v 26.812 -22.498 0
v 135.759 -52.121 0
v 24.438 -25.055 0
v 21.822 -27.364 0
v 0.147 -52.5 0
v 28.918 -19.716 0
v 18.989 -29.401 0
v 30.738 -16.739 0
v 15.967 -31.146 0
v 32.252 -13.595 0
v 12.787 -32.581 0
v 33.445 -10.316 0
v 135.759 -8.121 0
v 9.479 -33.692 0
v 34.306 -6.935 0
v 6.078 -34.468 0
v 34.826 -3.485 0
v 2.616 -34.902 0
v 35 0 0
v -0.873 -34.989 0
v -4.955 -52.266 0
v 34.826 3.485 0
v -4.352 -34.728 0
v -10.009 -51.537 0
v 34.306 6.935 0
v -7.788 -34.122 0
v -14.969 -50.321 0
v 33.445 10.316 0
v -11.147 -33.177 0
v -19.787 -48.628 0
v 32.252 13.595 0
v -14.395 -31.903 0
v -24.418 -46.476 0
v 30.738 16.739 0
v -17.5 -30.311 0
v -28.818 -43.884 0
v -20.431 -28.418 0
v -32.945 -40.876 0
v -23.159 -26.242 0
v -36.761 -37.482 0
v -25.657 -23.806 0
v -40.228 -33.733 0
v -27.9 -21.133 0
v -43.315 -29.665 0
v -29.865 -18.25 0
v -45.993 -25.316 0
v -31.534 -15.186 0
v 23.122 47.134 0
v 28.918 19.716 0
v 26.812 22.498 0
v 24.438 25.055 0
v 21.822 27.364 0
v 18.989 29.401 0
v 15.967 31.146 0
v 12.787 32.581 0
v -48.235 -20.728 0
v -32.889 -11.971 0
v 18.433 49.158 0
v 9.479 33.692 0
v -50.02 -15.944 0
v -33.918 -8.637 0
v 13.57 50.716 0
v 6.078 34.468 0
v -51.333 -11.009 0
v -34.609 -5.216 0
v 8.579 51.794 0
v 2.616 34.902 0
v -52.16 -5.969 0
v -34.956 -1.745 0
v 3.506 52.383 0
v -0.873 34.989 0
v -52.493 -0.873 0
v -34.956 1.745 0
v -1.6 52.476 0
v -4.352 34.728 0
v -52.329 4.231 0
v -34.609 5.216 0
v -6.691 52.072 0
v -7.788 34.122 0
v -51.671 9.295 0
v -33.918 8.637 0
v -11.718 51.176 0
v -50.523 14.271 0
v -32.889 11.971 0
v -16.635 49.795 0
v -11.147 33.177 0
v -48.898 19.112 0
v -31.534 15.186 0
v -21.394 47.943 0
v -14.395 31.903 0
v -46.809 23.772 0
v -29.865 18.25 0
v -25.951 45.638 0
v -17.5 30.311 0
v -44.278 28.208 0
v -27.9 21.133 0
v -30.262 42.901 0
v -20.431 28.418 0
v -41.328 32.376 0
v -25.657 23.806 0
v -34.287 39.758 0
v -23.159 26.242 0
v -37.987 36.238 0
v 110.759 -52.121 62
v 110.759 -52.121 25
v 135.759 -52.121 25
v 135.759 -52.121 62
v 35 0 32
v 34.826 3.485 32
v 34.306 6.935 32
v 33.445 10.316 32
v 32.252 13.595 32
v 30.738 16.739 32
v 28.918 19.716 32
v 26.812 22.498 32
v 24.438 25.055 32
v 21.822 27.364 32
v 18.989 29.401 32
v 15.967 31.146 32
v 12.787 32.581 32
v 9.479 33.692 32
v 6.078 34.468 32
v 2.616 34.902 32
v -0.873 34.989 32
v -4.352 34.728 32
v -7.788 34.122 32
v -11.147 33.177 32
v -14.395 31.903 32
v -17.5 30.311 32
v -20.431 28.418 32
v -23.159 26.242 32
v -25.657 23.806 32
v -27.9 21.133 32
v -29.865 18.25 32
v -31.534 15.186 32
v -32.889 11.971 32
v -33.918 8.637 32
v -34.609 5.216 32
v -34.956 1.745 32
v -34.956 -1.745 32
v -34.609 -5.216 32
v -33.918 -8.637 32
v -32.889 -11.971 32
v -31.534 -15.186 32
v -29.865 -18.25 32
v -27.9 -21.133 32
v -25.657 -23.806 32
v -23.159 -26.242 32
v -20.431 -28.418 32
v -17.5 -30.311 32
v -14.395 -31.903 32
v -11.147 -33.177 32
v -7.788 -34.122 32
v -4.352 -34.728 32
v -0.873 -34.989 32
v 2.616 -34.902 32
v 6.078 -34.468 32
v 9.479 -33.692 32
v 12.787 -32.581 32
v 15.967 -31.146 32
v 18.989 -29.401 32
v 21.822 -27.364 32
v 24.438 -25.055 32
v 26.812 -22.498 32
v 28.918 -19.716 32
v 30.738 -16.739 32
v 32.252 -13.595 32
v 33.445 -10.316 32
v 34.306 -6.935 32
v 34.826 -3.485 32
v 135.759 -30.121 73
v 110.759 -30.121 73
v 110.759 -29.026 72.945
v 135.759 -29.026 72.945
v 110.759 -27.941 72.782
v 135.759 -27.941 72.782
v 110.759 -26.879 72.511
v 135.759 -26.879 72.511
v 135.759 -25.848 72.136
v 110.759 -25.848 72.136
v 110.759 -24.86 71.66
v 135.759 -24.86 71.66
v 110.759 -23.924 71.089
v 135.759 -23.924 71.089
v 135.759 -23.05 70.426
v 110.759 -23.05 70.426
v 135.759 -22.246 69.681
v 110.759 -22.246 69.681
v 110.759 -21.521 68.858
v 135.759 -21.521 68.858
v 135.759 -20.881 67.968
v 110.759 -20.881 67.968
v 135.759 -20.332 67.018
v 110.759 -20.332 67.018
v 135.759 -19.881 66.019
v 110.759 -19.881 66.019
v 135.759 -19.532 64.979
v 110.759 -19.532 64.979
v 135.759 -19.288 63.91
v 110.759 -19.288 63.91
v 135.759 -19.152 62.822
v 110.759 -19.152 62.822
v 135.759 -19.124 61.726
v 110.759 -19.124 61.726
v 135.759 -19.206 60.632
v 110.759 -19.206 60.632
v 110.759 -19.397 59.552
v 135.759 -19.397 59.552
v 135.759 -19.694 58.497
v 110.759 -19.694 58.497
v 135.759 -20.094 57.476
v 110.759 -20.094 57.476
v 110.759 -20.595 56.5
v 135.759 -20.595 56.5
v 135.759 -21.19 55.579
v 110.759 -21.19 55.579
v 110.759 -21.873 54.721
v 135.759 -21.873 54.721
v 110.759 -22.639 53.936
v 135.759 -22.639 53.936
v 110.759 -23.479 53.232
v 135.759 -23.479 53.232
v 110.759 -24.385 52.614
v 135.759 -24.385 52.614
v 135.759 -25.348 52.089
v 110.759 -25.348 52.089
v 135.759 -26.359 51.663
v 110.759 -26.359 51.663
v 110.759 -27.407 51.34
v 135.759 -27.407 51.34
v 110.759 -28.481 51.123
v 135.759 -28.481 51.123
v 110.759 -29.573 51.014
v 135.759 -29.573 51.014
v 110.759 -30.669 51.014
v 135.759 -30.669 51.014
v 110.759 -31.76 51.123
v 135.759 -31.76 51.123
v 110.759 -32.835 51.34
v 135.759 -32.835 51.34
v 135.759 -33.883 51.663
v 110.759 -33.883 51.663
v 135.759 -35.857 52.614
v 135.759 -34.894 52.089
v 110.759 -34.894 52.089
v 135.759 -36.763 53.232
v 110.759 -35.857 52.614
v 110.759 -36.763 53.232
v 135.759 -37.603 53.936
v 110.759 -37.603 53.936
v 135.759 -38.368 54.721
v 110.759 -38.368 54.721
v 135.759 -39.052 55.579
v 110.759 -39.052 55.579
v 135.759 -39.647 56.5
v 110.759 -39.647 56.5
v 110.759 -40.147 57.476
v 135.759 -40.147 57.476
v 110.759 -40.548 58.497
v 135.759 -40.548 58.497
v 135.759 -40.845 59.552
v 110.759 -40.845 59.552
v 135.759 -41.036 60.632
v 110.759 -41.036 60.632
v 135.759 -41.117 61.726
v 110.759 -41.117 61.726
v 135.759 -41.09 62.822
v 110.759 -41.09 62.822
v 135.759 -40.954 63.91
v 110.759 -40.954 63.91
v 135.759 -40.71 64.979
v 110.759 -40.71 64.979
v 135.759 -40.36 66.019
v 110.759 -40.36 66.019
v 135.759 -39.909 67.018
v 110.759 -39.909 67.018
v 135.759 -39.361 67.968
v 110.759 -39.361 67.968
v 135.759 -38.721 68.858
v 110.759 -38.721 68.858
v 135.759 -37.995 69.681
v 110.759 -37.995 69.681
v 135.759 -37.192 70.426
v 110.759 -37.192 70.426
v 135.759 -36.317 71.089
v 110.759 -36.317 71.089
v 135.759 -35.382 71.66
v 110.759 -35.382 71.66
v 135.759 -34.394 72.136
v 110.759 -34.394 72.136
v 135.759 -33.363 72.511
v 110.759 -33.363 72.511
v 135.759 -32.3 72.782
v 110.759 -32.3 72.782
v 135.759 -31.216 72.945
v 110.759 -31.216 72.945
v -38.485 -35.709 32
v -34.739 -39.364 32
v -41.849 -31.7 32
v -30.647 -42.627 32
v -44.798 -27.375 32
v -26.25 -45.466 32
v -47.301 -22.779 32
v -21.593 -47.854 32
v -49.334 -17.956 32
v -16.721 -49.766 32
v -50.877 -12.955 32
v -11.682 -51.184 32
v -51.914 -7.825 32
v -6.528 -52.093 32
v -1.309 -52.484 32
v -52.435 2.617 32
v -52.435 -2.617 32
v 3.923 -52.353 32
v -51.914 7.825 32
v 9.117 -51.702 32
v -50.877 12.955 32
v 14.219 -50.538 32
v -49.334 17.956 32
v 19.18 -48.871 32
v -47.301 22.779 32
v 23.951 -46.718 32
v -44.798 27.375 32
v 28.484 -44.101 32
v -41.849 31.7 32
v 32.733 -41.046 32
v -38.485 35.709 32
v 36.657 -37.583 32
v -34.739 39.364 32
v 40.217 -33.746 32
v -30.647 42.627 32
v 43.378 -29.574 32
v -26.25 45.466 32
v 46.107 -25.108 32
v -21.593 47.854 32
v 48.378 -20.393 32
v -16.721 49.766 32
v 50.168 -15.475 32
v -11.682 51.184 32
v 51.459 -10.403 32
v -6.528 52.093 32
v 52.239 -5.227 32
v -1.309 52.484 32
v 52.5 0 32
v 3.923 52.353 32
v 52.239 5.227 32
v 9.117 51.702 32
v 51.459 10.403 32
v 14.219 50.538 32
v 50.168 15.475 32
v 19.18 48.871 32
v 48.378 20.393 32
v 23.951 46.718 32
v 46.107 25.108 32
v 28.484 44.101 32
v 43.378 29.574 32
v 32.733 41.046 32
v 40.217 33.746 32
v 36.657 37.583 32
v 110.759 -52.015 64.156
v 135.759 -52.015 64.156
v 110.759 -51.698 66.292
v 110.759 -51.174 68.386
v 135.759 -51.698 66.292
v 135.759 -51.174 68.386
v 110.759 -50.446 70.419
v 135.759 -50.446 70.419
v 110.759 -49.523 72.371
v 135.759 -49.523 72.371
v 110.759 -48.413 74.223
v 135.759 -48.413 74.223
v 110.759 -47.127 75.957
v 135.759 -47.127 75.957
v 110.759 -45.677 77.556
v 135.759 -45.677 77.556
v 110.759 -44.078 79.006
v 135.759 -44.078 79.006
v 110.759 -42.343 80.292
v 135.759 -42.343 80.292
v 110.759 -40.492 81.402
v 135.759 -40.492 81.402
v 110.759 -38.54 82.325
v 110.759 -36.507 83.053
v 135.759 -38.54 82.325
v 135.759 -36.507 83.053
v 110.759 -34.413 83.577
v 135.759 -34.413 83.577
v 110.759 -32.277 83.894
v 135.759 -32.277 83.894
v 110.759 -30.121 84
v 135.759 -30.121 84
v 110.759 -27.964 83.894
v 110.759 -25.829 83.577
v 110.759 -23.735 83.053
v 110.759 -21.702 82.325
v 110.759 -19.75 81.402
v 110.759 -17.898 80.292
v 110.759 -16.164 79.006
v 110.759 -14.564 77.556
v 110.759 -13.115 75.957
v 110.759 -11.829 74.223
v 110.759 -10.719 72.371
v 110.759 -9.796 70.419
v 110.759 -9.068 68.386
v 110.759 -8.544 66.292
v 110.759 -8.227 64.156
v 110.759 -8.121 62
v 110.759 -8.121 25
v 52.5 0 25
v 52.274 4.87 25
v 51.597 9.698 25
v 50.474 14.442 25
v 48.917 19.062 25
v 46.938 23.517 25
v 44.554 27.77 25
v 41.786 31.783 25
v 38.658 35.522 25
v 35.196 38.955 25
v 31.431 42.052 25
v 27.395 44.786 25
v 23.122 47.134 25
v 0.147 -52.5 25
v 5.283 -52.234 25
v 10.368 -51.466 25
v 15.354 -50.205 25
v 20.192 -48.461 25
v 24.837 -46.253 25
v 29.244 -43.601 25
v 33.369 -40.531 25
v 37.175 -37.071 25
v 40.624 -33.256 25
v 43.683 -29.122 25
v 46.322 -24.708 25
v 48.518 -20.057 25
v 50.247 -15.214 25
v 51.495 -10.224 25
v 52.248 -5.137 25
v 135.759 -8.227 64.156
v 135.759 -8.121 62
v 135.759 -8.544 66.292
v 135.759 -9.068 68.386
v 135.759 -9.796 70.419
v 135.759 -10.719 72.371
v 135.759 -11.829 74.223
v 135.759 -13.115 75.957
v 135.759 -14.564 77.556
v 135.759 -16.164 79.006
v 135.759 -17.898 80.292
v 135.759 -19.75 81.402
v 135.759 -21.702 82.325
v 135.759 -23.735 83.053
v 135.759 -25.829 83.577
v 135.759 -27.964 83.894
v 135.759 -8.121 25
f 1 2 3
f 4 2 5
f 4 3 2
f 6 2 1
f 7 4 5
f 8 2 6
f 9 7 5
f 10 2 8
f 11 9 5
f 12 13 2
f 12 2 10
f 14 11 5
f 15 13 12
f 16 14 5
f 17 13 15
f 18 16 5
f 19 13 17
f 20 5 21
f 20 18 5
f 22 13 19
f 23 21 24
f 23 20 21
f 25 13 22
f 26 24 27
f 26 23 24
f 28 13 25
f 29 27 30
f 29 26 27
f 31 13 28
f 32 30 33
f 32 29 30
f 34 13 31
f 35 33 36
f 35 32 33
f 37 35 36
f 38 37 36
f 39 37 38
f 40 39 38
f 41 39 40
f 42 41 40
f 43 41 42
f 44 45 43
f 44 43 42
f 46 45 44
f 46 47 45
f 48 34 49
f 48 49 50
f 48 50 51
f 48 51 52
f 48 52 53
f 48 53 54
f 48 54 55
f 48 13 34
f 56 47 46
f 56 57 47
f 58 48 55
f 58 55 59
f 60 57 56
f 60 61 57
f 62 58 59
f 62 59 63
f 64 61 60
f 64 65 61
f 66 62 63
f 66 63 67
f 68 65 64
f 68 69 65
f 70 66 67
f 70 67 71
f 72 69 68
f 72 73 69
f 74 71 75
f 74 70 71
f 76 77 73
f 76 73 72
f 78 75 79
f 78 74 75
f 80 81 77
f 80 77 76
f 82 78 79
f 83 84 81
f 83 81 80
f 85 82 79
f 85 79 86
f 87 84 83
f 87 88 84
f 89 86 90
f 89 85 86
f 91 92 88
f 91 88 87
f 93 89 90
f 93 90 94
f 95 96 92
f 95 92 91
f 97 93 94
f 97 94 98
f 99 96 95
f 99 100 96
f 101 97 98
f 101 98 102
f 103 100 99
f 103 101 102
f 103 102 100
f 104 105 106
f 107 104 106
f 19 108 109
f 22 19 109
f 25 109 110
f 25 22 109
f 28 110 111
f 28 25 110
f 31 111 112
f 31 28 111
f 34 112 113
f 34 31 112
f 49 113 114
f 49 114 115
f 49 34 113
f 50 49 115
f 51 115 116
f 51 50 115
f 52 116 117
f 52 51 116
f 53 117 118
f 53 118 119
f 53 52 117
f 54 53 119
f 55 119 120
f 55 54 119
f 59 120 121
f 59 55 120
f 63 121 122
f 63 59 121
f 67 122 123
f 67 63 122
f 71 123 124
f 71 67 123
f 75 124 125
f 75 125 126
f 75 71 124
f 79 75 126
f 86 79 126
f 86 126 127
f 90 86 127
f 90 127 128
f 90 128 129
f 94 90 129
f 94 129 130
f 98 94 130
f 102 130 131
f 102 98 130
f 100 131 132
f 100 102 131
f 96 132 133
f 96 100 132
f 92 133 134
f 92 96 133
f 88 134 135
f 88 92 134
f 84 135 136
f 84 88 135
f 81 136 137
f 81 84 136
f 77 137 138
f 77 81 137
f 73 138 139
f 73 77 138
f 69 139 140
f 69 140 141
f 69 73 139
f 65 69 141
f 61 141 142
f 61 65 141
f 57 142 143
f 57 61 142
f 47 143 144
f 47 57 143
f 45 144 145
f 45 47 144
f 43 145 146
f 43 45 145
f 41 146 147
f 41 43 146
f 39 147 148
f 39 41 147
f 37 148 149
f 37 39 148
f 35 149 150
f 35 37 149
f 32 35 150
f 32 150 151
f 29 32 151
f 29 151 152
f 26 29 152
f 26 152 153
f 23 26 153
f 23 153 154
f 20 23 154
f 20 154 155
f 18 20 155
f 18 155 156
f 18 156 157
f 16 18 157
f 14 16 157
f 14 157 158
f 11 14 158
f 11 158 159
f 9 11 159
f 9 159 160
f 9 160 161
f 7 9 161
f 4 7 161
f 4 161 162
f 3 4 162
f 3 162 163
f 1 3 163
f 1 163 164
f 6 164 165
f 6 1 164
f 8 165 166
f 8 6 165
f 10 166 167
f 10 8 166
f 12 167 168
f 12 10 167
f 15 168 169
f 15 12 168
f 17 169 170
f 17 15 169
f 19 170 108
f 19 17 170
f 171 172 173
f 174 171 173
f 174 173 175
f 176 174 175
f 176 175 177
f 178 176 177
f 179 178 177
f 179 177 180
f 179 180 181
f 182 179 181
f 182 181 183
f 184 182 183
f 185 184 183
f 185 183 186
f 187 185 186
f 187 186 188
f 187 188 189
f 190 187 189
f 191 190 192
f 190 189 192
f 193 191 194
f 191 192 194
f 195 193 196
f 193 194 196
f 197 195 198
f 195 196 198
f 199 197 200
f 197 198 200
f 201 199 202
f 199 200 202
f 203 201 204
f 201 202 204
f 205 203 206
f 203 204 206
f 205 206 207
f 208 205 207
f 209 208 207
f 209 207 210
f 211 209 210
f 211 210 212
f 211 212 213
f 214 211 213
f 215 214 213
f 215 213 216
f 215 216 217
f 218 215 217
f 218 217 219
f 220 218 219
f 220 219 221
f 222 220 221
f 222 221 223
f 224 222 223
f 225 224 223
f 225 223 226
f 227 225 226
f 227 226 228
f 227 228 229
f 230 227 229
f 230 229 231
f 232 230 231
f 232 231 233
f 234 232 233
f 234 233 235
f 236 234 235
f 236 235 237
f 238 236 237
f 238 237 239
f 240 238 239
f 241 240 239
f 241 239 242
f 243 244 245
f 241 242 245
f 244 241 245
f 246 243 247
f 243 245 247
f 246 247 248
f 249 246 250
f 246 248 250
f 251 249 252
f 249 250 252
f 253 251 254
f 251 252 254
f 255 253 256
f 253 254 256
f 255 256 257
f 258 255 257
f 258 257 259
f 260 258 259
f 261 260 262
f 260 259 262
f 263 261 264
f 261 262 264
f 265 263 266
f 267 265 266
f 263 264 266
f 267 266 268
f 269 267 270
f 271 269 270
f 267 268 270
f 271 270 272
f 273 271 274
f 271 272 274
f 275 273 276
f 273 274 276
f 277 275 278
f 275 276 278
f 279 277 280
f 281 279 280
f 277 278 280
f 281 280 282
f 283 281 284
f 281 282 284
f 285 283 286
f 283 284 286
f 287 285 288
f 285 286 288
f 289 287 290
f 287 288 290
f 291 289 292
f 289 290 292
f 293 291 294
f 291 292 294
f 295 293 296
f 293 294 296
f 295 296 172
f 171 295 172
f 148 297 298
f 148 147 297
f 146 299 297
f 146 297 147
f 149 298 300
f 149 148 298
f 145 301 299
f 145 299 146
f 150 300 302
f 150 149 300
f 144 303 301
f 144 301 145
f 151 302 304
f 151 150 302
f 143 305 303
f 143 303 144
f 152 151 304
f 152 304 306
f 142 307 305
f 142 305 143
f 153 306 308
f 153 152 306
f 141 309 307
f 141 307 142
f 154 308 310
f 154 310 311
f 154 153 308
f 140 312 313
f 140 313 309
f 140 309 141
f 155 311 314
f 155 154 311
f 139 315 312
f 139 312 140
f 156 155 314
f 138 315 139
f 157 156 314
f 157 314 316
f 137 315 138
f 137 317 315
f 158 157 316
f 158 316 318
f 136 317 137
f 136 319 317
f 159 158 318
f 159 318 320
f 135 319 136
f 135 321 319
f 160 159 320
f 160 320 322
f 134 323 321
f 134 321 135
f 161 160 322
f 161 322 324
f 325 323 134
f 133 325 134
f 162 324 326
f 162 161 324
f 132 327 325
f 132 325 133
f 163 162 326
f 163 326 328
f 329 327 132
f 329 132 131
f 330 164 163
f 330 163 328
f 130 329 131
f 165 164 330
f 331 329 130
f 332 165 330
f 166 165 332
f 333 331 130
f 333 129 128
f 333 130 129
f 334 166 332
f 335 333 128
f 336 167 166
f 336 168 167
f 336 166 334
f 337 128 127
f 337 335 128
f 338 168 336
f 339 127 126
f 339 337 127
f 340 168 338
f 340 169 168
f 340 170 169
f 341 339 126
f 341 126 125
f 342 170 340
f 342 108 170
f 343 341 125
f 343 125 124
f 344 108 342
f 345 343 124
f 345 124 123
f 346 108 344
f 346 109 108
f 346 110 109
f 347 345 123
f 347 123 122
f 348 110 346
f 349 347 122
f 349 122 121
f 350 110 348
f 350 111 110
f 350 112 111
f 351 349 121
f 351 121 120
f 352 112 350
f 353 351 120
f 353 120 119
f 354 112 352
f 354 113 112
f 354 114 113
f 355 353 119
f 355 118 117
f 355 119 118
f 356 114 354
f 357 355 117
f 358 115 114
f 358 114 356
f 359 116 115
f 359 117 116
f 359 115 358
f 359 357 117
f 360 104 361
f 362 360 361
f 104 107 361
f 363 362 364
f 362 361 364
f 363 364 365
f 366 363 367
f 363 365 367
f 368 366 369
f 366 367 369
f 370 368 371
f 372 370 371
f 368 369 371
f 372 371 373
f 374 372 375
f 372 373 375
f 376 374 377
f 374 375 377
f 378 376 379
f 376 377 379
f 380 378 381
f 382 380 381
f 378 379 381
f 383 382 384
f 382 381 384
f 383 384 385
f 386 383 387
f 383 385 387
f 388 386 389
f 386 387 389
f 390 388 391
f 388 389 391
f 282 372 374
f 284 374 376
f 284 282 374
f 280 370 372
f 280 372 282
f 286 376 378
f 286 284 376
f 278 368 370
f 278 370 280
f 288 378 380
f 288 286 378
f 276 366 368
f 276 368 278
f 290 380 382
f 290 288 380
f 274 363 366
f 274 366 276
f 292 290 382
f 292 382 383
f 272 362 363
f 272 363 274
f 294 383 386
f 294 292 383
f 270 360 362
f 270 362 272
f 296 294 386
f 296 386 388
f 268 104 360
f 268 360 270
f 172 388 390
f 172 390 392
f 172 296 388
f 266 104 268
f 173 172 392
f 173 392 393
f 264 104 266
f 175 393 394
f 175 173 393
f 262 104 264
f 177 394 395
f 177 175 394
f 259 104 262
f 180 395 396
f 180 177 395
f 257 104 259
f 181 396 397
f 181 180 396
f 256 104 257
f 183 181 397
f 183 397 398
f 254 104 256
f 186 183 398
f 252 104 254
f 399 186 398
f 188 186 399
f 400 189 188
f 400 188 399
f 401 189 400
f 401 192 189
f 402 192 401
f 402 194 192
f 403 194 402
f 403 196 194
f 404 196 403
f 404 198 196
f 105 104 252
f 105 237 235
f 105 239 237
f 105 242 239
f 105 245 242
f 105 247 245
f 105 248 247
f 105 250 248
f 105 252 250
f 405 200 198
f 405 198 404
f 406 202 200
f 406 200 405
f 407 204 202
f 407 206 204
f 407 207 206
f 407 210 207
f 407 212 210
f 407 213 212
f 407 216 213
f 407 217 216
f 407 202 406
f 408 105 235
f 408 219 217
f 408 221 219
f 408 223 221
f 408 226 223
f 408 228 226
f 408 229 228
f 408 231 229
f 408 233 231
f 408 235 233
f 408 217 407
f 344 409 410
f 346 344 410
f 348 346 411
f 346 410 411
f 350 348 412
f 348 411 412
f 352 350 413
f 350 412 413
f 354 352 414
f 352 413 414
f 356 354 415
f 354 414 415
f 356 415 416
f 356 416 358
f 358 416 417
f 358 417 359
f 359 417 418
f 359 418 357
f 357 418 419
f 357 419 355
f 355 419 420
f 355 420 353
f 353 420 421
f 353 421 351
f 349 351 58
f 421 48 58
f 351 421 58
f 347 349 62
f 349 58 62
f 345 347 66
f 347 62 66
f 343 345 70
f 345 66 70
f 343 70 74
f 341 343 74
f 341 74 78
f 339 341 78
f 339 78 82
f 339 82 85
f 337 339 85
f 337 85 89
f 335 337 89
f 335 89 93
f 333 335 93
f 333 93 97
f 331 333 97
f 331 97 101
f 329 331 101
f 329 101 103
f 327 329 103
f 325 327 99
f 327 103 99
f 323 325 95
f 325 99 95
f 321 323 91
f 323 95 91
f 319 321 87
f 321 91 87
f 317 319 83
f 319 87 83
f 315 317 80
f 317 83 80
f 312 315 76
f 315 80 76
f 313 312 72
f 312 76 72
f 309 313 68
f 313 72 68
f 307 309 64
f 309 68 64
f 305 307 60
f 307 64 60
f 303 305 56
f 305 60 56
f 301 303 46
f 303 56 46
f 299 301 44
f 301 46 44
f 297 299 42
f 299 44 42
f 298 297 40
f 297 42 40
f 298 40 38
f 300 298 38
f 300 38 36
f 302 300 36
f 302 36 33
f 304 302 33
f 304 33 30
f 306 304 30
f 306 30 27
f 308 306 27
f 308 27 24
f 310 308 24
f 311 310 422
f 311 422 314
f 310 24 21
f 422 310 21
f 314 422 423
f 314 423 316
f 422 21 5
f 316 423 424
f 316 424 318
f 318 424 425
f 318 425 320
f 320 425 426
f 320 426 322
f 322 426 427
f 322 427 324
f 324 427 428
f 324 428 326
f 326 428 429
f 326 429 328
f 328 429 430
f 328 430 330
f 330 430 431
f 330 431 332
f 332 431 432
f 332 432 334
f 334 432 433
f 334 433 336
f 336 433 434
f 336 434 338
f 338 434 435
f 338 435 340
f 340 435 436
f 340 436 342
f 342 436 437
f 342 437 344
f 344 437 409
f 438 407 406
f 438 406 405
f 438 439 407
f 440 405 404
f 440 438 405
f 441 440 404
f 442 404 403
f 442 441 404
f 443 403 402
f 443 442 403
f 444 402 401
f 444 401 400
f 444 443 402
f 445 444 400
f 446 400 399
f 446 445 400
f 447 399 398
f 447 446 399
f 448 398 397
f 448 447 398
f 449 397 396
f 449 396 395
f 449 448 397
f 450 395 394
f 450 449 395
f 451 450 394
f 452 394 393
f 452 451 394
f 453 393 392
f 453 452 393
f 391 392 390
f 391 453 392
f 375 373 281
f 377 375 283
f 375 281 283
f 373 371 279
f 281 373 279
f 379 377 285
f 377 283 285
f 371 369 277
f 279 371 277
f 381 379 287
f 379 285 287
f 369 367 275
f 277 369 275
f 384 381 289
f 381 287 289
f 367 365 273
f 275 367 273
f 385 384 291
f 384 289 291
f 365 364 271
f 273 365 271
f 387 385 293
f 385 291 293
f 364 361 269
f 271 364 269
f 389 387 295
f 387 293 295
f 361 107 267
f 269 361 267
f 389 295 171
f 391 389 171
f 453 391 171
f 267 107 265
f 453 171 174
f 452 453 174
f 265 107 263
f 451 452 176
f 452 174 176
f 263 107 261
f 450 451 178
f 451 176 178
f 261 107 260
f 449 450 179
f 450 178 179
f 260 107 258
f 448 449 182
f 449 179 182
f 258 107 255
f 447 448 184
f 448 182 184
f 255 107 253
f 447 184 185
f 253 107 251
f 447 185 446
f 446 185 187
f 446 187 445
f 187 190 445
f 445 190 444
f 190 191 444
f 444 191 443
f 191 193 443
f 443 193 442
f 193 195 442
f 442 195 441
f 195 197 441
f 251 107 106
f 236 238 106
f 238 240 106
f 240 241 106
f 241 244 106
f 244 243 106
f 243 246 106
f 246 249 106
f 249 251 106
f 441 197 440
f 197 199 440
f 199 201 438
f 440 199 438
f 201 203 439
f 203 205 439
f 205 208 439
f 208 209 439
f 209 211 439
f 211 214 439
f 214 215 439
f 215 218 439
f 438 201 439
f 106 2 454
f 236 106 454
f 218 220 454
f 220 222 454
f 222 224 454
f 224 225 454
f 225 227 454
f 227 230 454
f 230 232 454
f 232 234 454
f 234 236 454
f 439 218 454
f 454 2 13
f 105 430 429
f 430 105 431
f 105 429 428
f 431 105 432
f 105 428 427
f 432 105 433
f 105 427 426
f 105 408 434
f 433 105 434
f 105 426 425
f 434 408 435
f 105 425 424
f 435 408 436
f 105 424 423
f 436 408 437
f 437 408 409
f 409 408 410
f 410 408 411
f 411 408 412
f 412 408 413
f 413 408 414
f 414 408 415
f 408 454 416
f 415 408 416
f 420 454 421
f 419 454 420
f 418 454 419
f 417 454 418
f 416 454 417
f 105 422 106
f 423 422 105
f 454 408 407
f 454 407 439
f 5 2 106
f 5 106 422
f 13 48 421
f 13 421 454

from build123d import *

# Parameters (mm, degrees)
SKETCH_1_R          = 52.5
SKETCH_1_R_2        = 35
EXTRUDE_1_DEPTH     = 32
EXTRUDE_3_DEPTH     = 25
SKETCH_3_W          = 25
SKETCH_3_H          = 44
EXTRUDE_4_DEPTH     = 59
FILLET_1_R          = 22
SKETCH_4_R          = 11
CUT_EXTRUDE_1_DEPTH = 59


with BuildPart() as part:
    # 스케치1 → 보스-돌출1 (new body)
    with BuildSketch(Plane.XY):
        Circle(SKETCH_1_R)
        Circle(SKETCH_1_R_2, mode=Mode.SUBTRACT)
    extrude(amount=EXTRUDE_1_DEPTH)

    # 스케치2 → 보스-돌출3 (add)
    with BuildSketch(Plane(origin=(0, 0, 0), x_dir=(-1, 0, 0), z_dir=(0, 0, -1))):
        with BuildLine():
            Line((-23.122008196, 47.134093149), (-135.758979711, -8.120878455))
            Line((-135.758979711, -8.120878455), (-135.758979711, -52.120878455))
            Line((-135.758979711, -52.120878455), (-0.146690573, -52.499795065))
            ThreePointArc((-0.146690573, -52.499795065), (-51.157462855, -11.796778977), (-23.122008196, 47.134093149))
        make_face()
    extrude(amount=-EXTRUDE_3_DEPTH)

    # 스케치3 → 보스-돌출4 (add)
    with BuildSketch(Plane.XY.offset(25)):
        with Locations((123.258979711, -30.120878455)):
            Rectangle(SKETCH_3_W, SKETCH_3_H)
    extrude(amount=EXTRUDE_4_DEPTH)

    # 필렛1
    fillet_1_edges = [part.edges().sort_by_distance(p)[0] for p in [
        (123.258979711, -8.120878455, 84),
        (123.258979711, -52.120878455, 84),
    ]]
    fillet(fillet_1_edges, radius=FILLET_1_R - 0.0001)  # a hair under: the kernel refuses the full size

    # 스케치4 → 컷-돌출1 (cut)
    with BuildSketch(Plane.ZY.offset(-110.758979711)):
        with Locations((62, -30.120878455)):
            Circle(SKETCH_4_R)
    extrude(amount=-CUT_EXTRUDE_1_DEPTH, mode=Mode.SUBTRACT)


solid = part.part
